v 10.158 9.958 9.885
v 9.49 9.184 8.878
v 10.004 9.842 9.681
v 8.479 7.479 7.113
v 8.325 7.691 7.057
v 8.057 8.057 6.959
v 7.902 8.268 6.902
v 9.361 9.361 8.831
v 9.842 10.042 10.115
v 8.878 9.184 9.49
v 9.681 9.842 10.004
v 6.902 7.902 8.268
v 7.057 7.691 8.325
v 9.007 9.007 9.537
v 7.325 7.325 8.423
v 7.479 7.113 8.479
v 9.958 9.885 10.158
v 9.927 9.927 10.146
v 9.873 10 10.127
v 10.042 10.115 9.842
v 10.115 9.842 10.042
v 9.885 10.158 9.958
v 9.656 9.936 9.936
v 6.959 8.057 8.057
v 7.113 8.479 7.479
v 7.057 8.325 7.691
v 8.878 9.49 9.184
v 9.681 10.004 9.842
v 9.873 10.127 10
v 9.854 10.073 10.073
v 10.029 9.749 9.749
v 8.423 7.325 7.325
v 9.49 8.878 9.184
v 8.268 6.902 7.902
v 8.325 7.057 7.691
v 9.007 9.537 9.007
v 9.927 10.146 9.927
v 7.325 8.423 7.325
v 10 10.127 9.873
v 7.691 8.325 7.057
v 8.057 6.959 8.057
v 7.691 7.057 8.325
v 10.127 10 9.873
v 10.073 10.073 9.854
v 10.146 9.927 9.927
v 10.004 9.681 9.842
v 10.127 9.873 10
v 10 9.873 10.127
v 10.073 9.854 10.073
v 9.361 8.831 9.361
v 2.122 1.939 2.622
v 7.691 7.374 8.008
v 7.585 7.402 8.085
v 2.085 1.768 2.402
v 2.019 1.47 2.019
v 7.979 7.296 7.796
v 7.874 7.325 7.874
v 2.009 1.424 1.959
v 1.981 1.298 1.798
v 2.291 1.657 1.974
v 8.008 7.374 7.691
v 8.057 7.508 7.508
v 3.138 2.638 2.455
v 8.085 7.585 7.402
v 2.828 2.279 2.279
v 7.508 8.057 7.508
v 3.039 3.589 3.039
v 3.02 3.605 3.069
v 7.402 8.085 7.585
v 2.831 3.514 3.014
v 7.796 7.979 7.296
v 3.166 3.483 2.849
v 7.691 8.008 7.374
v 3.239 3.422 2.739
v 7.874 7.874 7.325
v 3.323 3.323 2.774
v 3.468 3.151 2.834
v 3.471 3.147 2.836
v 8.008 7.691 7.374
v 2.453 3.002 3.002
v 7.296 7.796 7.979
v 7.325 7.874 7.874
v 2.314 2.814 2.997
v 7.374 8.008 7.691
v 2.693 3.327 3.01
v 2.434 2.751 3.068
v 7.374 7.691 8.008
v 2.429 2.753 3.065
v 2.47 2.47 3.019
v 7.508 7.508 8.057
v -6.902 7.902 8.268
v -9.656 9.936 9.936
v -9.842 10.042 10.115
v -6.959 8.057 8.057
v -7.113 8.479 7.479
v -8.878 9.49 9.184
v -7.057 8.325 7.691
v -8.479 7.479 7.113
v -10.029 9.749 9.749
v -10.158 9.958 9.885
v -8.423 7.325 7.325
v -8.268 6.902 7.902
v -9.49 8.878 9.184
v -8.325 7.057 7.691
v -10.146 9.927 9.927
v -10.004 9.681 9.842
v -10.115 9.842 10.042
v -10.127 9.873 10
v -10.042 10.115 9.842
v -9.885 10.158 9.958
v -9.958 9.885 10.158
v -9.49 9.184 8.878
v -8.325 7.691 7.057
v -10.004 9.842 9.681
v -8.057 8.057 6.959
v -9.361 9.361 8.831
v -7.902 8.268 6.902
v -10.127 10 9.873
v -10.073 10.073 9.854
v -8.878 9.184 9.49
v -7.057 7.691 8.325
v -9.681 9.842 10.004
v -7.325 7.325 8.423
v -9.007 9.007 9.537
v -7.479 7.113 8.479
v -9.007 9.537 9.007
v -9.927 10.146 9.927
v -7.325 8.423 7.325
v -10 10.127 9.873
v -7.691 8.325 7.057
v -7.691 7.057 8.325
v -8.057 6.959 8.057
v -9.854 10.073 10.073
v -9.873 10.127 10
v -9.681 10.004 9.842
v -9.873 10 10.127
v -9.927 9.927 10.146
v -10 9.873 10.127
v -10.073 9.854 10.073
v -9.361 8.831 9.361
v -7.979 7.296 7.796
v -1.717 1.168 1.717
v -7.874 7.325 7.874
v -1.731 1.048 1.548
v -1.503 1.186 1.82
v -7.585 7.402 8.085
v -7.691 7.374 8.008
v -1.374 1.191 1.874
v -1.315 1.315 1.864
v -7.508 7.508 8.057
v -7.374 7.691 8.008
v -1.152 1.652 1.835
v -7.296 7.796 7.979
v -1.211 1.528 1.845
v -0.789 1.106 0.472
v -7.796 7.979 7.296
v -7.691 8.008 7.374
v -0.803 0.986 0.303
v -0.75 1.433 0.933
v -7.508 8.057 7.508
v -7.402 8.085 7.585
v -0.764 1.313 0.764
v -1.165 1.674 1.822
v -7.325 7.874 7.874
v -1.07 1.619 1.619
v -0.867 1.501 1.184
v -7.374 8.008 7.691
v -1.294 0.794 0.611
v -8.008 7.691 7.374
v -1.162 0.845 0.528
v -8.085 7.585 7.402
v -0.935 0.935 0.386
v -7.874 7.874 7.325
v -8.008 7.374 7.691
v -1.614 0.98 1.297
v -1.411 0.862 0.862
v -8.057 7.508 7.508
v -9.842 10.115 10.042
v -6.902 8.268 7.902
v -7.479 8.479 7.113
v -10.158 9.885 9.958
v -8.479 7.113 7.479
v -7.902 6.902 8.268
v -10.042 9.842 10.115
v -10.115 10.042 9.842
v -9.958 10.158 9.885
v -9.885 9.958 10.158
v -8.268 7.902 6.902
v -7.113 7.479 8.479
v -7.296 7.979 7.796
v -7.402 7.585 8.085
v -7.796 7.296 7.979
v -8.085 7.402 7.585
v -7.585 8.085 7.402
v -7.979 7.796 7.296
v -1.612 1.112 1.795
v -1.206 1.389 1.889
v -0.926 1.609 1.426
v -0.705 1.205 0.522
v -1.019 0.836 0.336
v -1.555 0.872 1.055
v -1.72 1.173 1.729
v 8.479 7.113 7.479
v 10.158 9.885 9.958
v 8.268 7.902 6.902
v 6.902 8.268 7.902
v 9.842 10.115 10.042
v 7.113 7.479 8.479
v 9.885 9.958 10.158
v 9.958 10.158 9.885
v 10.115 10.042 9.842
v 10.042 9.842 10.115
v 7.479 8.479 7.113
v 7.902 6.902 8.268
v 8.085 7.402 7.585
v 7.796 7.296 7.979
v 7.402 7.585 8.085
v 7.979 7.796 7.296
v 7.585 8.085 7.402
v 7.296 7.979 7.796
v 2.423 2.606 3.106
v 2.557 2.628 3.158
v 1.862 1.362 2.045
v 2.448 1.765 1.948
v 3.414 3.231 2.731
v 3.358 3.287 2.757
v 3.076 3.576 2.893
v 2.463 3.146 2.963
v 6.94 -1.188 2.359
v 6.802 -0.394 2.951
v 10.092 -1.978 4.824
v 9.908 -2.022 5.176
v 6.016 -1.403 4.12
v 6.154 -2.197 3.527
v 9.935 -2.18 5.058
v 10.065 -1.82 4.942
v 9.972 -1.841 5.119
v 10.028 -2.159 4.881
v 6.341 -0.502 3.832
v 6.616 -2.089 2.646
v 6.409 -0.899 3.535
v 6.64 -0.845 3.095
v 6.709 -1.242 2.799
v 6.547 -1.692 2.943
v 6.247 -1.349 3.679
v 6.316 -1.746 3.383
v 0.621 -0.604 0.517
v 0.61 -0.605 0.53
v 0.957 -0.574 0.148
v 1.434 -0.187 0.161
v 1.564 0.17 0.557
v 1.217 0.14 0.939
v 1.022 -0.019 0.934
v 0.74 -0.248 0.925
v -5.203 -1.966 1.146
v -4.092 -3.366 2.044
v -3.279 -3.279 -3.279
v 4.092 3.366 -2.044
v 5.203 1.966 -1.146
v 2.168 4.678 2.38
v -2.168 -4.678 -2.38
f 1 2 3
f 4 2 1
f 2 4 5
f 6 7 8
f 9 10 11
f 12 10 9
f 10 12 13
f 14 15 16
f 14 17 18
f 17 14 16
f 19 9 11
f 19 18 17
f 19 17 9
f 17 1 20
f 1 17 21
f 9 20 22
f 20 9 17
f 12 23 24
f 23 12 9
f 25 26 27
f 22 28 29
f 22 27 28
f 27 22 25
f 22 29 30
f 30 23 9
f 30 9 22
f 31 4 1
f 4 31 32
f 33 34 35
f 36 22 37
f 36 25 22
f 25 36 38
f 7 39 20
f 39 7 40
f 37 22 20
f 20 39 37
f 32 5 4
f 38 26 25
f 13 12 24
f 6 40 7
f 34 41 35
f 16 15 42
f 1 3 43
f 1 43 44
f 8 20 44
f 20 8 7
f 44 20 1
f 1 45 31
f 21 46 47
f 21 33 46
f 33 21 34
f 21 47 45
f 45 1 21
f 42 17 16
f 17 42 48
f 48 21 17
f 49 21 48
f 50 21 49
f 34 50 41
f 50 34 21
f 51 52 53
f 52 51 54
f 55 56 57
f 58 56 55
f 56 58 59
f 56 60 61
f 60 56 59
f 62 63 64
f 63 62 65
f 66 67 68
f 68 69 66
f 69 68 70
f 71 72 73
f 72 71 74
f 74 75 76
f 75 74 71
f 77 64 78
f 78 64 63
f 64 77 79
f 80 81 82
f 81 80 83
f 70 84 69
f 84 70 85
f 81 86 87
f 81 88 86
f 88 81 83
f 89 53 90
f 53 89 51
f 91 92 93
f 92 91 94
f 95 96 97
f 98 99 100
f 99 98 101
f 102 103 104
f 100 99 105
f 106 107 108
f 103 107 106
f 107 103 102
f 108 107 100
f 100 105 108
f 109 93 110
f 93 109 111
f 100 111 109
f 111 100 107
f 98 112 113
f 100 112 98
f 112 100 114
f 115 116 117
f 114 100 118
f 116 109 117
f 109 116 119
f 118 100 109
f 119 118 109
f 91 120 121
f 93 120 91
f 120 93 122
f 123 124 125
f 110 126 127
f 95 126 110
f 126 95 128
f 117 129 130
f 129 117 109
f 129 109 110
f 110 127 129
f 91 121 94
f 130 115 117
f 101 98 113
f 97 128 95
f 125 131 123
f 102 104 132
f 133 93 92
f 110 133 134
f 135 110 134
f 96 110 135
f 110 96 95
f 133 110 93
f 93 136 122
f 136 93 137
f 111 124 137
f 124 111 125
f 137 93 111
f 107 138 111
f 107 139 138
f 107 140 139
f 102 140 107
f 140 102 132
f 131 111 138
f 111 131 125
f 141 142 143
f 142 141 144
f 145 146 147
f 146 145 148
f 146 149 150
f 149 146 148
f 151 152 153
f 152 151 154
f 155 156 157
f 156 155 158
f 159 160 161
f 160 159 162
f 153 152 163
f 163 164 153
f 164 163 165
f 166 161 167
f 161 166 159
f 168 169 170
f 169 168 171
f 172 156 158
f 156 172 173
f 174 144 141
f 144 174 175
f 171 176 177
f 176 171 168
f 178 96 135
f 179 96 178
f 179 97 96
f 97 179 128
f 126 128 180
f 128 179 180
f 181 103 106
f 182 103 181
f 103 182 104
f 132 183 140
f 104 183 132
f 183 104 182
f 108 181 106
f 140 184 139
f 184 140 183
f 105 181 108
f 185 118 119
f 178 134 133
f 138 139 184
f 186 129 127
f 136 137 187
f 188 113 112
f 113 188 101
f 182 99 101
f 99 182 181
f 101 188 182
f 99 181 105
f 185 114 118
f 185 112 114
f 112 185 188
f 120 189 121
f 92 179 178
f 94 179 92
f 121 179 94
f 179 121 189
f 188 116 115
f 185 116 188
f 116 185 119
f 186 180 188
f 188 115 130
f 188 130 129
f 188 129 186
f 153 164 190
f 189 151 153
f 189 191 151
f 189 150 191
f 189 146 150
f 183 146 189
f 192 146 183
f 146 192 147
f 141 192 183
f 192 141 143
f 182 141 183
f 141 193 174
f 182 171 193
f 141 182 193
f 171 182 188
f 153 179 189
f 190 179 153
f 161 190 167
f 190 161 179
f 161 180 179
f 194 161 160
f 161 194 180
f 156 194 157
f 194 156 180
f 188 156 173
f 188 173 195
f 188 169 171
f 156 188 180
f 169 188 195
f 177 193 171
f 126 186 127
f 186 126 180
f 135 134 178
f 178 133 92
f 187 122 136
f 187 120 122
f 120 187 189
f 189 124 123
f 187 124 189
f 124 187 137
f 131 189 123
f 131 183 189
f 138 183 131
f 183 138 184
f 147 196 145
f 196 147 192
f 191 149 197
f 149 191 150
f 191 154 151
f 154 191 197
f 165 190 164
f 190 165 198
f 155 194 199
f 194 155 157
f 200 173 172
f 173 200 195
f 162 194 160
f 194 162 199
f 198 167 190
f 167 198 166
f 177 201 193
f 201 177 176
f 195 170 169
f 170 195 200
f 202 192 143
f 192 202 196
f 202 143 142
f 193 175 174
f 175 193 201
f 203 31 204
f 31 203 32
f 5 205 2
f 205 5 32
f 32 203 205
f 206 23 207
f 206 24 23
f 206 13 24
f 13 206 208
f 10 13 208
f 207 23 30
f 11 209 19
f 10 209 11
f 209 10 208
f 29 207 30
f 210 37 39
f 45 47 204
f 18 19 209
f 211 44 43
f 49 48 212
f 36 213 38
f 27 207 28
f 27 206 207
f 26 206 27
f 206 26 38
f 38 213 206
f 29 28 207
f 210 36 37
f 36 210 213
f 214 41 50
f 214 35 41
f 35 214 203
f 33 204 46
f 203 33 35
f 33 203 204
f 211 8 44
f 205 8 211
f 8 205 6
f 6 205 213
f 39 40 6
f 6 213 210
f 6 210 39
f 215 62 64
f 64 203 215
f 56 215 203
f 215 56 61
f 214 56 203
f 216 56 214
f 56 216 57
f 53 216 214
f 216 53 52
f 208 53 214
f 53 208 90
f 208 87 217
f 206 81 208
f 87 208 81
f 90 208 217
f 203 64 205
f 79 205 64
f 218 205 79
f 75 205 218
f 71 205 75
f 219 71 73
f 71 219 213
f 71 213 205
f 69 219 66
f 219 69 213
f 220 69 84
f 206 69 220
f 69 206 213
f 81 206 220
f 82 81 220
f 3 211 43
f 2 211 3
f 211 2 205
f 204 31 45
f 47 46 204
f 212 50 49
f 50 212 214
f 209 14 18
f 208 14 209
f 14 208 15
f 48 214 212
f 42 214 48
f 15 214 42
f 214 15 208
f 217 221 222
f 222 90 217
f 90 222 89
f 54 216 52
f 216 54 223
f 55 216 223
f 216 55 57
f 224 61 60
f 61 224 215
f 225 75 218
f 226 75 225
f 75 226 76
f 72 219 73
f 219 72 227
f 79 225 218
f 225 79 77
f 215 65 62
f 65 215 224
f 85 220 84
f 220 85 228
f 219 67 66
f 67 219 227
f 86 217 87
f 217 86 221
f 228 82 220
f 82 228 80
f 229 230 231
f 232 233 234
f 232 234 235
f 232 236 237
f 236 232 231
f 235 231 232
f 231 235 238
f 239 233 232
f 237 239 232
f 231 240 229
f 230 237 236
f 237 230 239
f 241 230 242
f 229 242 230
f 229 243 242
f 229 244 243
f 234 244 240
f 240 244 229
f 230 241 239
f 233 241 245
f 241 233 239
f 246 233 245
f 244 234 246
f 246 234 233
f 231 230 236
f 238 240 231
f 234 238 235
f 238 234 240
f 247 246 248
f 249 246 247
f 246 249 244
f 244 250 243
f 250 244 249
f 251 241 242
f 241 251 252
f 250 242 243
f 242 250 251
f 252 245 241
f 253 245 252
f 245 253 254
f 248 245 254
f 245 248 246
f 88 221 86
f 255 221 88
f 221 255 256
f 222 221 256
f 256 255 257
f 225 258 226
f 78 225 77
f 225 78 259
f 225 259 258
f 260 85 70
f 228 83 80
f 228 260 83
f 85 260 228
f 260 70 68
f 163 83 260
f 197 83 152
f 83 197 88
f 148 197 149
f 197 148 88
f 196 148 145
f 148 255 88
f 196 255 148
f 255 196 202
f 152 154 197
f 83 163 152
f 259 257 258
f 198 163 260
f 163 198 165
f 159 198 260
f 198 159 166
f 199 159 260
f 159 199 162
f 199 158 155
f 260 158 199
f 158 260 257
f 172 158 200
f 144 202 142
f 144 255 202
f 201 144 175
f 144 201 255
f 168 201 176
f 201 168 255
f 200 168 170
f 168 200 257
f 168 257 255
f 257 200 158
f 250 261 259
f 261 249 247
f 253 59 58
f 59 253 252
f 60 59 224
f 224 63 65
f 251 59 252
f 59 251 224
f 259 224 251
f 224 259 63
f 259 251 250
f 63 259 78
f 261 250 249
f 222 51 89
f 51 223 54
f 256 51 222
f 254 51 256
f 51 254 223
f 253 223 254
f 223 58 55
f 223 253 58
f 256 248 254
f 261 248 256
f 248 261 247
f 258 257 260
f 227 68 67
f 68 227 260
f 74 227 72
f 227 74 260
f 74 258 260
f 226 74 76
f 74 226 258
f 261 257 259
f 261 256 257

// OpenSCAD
//---------------------------------------------------------------
//-- Openscad vector library
//-- This is a component of the obiscad opescad tools by Obijuan
//-- (C) Juan Gonzalez-Gomez (Obijuan)
//-- Sep-2012
//---------------------------------------------------------------
//-- Released under the GPL license
//---------------------------------------------------------------

obiscad_drawing_resolution = 6;

//----------------------------------------
//-- FUNCTIONS FOR WORKING WITH VECTORS
//----------------------------------------

//-- Calculate the module of a vector
function mod(v) = (sqrt(v[0]*v[0]+v[1]*v[1]+v[2]*v[2]));

//-- Calculate the cros product of two vectors
function cross(u,v) = [
  u[1]*v[2] - v[1]*u[2],
  -(u[0]*v[2] - v[0]*u[2]) ,
  u[0]*v[1] - v[0]*u[1]];

//-- Calculate the dot product of two vectors
function dot(u,v) = u[0]*v[0]+u[1]*v[1]+u[2]*v[2];

//-- Return the unit vector of a vector
function unitv(v) = v/mod(v);

//-- Return the angle between two vectores
function anglev(u,v) = acos( dot(u,v) / (mod(u)*mod(v)) );

//----------------------------------------------------------
//--  Draw a point in the position given by the vector p  
//----------------------------------------------------------
module point(p)
{
  translate(p)
    sphere(r=0.7,$fn=20);
}

//------------------------------------------------------------------
//-- Draw a vector poiting to the z axis
//-- This is an auxiliary module for implementing the vector module
//--
//-- Parameters:
//--  l: total vector length (line + arrow)
//--  l_arrow: Vector arrow length
//--  mark: If true, a mark is draw in the vector head, for having
//--    a visual reference of the rolling angle
//------------------------------------------------------------------
module vectorz(l=10, l_arrow=4, mark=false)
{
  //-- vector body length (not including the arrow)
  lb = l - l_arrow;

  //-- The vector is locatead at 0,0,0
  translate([0,0,lb/2])
  union() {

    //-- Draw the arrow
    translate([0,0,lb/2])
      cylinder(r1=2/2, r2=0.2, h=l_arrow, $fn=obiscad_drawing_resolution);

    //-- Draw the mark
    if (mark) {
      translate([0,0,lb/2+l_arrow/2])
      translate([1,0,0])
        cube([2,0.3,l_arrow*0.8],center=true);
    }

    //-- Draw the body
    cylinder(r=1/2, h=lb, center=true, $fn=obiscad_drawing_resolution);
  }

  //-- Draw a sphere in the vector base
  sphere(r=1/2, $fn=obiscad_drawing_resolution);
}

//-----------------------------------------------------------------
//-- ORIENTATE OPERATOR
//--
//--  Orientate an object to the direction given by the vector v
//--  Parameters:
//--    v : Target orientation
//--    vref: Vector reference. It is the vector of the local frame
//--          of the object that want to be poiting in the direction
//--          of v
//--    roll: Rotation of the object around the v axis
//-------------------------------------------------------------------
module orientate(v,vref=[0,0,1], roll=0)
{
  //-- Calculate the rotation axis
  raxis = cross(vref,v);
  
  //-- Calculate the angle between the vectors
  ang = anglev(vref,v);

  //-- Rotate the child!
  rotate(a=roll, v=v)
    rotate(a=ang, v=raxis)
      child(0);
}

//---------------------------------------------------------------------------
//-- Draw a vector 
//--
//-- There are two modes of drawing the vector
//-- * Mode 1: Given by a cartesian point(x,y,z). A vector from the origin
//--           to the end (x,y,z) is drawn. The l parameter (length) must 
//--           be 0  (l=0)
//-- * Mode 2: Give by direction and length
//--           A vector of length l pointing to the direction given by
//--           v is drawn
//---------------------------------------------------------------------------
//-- Parameters:
//--  v: Vector cartesian coordinates
//--  l: total vector length (line + arrow)
//--  l_arrow: Vector arrow length
//    mark: If true, a mark is draw in the vector head, for having
//--    a visual reference of the rolling angle
//---------------------------------------------------------------------------
module vector(v,l=0, l_arrow=4, mark=false)
{
  //-- Get the vector length from the coordinates
  mod = mod(v);

  //-- The vector is very easy implemented by means of the orientate
  //-- operator:
  //--  orientate(v) vectorz(l=mod, l_arrow=l_arrow)
  //--  BUT... in OPENSCAD 2012.02.22 the recursion does not
  //--    not work, so that if the user use the orientate operator
  //--    on a vector, openscad will ignore it..
  //-- The solution at the moment (I hope the openscad developers
  //--  implement the recursion in the near future...)
  //--  is to repite the orientate operation in this module

  //---- SAME CALCULATIONS THAN THE ORIENTATE OPERATOR!
  //-- Calculate the rotation axis

  vref = [0,0,1];
  raxis = cross(vref,v);
  
  //-- Calculate the angle between the vectors
  ang = anglev(vref,v);

  //-- orientate the vector
  //-- Draw the vector. The vector length is given either
  //--- by the mod variable (when l=0) or by l (when l!=0)
  if (l==0)
    rotate(a=ang, v=raxis)
      vectorz(l=mod, l_arrow=l_arrow, mark=mark);
  else
    rotate(a=ang, v=raxis)
      vectorz(l=l, l_arrow=l_arrow, mark=mark);

}

//----------------------------------------------------
//-- Draw a Frame of reference
//-- Parameters:
//-- l: length of the Unit vectors
//-----------------------------------------------------
module frame(l=10, l_arrow=4)
{

  //-- Z unit vector
  color("Blue")
    vector([0,0,l], l_arrow=l_arrow);

  //-- X unit vector
  color("Red")
    vector([l,0,0], l_arrow=l_arrow );

  //-- Y unit vector
  color("Green")
    vector([0,l,0],l_arrow=l_arrow);

  //-- Origin
  color("Gray")
    sphere(r=1, $fn=obiscad_drawing_resolution);
}

//--------------------------------------------------
//-- Modules for testings and examples
//-- Testing that the vector library is working ok
//--------------------------------------------------

//-- 22 vectors in total are drawn, poiting to different directions
module Test_vectors1()
{

  a = 20;
  k = 1;

  //--  Add a frame of reference (in the origin)
  frame(l=a);

  //-- Negative vectors, pointing towards the three axis: -x, -y, -z
  color("Red")   vector([-a, 0,  0]);
  color("Green") vector([0, -a,  0]);
  color("Blue")  vector([0,  0, -a]);

  //-- It is *not* has been implemented using a for loop on purpose
  //-- This way, individual vectors can be commented out or highlighted

  //-- vectors with positive z
  vector([a,   a, a*k]);
  vector([0,   a, a*k]);
  vector([-a,  a, a*k]);
  vector([-a,  0, a*k]);

  vector([-a, -a, a*k]);
  vector([0,  -a, a*k]);
  vector([a,  -a, a*k]);
  vector([a,   0, a*k]);


  //-- Vectors with negative z
  vector([a,   a, -a*k]);
  vector([0,   a, -a*k]);
  vector([-a,  a, -a*k]);
  vector([-a,  0, -a*k]);

  vector([-a, -a, -a*k]);
  vector([0,  -a, -a*k]);
  vector([a,  -a, -a*k]);
  vector([a,   0, -a*k]);
}

//--- Another test...
module Test_vectors2()
{

  //-- Add the vector into the vector table
  //-- This vectors are taken as directions
  //-- All the vectors will be drawn with the same length (l)
  vector_table = [
    [1,   1, 1],
    [0,   1, 1],
    [-1,  1, 1],
    [-1,  0, 1],
    [-1, -1, 1],
    [0,  -1, 1],
    [1,  -1, 1],
    [1,   0, 1],
  
    [1,   1, -1],
    [0,   1, -1],
    [-1,  1, -1],
    [-1,  0, -1],
    [-1, -1, -1],
    [0,  -1, -1],
    [1,  -1, -1],
    [1,   0, -1],
  ];

  //-- Vector length
  l=20;

  frame(l=10);

  //-- Draw all the vector given in the table
  //-- The vectors point to the direction given in the table
  //-- They all are drawn with a length equal to l
  for (v=vector_table) {
    //-- Vector given by direction and length
    vector(v,l=l);
  }
}


//-- Test the cross product and the angle
//-- between vectors
module Test_vector3()
{
  //-- Start with 2 unit vectors
  v=unitv([1,1,1]);
  u=unitv([0,1,0]);

  //-- Draw the vector in different colors
  //-- Increase the length for drawing
  color("Red") vector(v*20);
  color("blue") vector(u*20);

  //-- Get the cross product
  w = cross(v,u);
  vector(w*20);

  //-- The cross product is NOT conmutative... 
  //-- change the order of v and u
  w2 = cross(u,v);
  vector(w2*20);

  //-- w should be perpendicular to v and u
  //-- Calculate the angles between them:
  echo("U , V: ", anglev(u,v));
  echo("W , U: ", anglev(w,u));
  echo("W , V: ", anglev(w,v));

}

//-- Test the orientate operator
module Test_vector4()
{
  o = [10,10,10];
  v = [-10,10,10];

  color("Red") vector(o);
  color("Blue") vector(v);

  //-- Orientate the vector o in the direction of v
  orientate(v,o)
    vector(o);

  //-- Inverse operation: orientate the v vector in the direction
  //-- of o
  orientate(o,v)
    vector(v);

  //-- Example of orientation of a cube
  orientate(o,vref=[10,-2,5],roll=0)
    cube([10,2,5],center=true);

  vector([10,-2,5]);

}

//-------- Perform tests......

Test_vector4();


/*

Test_vectors1();


translate([60,0,0]) 
  Test_vectors2();
*/
